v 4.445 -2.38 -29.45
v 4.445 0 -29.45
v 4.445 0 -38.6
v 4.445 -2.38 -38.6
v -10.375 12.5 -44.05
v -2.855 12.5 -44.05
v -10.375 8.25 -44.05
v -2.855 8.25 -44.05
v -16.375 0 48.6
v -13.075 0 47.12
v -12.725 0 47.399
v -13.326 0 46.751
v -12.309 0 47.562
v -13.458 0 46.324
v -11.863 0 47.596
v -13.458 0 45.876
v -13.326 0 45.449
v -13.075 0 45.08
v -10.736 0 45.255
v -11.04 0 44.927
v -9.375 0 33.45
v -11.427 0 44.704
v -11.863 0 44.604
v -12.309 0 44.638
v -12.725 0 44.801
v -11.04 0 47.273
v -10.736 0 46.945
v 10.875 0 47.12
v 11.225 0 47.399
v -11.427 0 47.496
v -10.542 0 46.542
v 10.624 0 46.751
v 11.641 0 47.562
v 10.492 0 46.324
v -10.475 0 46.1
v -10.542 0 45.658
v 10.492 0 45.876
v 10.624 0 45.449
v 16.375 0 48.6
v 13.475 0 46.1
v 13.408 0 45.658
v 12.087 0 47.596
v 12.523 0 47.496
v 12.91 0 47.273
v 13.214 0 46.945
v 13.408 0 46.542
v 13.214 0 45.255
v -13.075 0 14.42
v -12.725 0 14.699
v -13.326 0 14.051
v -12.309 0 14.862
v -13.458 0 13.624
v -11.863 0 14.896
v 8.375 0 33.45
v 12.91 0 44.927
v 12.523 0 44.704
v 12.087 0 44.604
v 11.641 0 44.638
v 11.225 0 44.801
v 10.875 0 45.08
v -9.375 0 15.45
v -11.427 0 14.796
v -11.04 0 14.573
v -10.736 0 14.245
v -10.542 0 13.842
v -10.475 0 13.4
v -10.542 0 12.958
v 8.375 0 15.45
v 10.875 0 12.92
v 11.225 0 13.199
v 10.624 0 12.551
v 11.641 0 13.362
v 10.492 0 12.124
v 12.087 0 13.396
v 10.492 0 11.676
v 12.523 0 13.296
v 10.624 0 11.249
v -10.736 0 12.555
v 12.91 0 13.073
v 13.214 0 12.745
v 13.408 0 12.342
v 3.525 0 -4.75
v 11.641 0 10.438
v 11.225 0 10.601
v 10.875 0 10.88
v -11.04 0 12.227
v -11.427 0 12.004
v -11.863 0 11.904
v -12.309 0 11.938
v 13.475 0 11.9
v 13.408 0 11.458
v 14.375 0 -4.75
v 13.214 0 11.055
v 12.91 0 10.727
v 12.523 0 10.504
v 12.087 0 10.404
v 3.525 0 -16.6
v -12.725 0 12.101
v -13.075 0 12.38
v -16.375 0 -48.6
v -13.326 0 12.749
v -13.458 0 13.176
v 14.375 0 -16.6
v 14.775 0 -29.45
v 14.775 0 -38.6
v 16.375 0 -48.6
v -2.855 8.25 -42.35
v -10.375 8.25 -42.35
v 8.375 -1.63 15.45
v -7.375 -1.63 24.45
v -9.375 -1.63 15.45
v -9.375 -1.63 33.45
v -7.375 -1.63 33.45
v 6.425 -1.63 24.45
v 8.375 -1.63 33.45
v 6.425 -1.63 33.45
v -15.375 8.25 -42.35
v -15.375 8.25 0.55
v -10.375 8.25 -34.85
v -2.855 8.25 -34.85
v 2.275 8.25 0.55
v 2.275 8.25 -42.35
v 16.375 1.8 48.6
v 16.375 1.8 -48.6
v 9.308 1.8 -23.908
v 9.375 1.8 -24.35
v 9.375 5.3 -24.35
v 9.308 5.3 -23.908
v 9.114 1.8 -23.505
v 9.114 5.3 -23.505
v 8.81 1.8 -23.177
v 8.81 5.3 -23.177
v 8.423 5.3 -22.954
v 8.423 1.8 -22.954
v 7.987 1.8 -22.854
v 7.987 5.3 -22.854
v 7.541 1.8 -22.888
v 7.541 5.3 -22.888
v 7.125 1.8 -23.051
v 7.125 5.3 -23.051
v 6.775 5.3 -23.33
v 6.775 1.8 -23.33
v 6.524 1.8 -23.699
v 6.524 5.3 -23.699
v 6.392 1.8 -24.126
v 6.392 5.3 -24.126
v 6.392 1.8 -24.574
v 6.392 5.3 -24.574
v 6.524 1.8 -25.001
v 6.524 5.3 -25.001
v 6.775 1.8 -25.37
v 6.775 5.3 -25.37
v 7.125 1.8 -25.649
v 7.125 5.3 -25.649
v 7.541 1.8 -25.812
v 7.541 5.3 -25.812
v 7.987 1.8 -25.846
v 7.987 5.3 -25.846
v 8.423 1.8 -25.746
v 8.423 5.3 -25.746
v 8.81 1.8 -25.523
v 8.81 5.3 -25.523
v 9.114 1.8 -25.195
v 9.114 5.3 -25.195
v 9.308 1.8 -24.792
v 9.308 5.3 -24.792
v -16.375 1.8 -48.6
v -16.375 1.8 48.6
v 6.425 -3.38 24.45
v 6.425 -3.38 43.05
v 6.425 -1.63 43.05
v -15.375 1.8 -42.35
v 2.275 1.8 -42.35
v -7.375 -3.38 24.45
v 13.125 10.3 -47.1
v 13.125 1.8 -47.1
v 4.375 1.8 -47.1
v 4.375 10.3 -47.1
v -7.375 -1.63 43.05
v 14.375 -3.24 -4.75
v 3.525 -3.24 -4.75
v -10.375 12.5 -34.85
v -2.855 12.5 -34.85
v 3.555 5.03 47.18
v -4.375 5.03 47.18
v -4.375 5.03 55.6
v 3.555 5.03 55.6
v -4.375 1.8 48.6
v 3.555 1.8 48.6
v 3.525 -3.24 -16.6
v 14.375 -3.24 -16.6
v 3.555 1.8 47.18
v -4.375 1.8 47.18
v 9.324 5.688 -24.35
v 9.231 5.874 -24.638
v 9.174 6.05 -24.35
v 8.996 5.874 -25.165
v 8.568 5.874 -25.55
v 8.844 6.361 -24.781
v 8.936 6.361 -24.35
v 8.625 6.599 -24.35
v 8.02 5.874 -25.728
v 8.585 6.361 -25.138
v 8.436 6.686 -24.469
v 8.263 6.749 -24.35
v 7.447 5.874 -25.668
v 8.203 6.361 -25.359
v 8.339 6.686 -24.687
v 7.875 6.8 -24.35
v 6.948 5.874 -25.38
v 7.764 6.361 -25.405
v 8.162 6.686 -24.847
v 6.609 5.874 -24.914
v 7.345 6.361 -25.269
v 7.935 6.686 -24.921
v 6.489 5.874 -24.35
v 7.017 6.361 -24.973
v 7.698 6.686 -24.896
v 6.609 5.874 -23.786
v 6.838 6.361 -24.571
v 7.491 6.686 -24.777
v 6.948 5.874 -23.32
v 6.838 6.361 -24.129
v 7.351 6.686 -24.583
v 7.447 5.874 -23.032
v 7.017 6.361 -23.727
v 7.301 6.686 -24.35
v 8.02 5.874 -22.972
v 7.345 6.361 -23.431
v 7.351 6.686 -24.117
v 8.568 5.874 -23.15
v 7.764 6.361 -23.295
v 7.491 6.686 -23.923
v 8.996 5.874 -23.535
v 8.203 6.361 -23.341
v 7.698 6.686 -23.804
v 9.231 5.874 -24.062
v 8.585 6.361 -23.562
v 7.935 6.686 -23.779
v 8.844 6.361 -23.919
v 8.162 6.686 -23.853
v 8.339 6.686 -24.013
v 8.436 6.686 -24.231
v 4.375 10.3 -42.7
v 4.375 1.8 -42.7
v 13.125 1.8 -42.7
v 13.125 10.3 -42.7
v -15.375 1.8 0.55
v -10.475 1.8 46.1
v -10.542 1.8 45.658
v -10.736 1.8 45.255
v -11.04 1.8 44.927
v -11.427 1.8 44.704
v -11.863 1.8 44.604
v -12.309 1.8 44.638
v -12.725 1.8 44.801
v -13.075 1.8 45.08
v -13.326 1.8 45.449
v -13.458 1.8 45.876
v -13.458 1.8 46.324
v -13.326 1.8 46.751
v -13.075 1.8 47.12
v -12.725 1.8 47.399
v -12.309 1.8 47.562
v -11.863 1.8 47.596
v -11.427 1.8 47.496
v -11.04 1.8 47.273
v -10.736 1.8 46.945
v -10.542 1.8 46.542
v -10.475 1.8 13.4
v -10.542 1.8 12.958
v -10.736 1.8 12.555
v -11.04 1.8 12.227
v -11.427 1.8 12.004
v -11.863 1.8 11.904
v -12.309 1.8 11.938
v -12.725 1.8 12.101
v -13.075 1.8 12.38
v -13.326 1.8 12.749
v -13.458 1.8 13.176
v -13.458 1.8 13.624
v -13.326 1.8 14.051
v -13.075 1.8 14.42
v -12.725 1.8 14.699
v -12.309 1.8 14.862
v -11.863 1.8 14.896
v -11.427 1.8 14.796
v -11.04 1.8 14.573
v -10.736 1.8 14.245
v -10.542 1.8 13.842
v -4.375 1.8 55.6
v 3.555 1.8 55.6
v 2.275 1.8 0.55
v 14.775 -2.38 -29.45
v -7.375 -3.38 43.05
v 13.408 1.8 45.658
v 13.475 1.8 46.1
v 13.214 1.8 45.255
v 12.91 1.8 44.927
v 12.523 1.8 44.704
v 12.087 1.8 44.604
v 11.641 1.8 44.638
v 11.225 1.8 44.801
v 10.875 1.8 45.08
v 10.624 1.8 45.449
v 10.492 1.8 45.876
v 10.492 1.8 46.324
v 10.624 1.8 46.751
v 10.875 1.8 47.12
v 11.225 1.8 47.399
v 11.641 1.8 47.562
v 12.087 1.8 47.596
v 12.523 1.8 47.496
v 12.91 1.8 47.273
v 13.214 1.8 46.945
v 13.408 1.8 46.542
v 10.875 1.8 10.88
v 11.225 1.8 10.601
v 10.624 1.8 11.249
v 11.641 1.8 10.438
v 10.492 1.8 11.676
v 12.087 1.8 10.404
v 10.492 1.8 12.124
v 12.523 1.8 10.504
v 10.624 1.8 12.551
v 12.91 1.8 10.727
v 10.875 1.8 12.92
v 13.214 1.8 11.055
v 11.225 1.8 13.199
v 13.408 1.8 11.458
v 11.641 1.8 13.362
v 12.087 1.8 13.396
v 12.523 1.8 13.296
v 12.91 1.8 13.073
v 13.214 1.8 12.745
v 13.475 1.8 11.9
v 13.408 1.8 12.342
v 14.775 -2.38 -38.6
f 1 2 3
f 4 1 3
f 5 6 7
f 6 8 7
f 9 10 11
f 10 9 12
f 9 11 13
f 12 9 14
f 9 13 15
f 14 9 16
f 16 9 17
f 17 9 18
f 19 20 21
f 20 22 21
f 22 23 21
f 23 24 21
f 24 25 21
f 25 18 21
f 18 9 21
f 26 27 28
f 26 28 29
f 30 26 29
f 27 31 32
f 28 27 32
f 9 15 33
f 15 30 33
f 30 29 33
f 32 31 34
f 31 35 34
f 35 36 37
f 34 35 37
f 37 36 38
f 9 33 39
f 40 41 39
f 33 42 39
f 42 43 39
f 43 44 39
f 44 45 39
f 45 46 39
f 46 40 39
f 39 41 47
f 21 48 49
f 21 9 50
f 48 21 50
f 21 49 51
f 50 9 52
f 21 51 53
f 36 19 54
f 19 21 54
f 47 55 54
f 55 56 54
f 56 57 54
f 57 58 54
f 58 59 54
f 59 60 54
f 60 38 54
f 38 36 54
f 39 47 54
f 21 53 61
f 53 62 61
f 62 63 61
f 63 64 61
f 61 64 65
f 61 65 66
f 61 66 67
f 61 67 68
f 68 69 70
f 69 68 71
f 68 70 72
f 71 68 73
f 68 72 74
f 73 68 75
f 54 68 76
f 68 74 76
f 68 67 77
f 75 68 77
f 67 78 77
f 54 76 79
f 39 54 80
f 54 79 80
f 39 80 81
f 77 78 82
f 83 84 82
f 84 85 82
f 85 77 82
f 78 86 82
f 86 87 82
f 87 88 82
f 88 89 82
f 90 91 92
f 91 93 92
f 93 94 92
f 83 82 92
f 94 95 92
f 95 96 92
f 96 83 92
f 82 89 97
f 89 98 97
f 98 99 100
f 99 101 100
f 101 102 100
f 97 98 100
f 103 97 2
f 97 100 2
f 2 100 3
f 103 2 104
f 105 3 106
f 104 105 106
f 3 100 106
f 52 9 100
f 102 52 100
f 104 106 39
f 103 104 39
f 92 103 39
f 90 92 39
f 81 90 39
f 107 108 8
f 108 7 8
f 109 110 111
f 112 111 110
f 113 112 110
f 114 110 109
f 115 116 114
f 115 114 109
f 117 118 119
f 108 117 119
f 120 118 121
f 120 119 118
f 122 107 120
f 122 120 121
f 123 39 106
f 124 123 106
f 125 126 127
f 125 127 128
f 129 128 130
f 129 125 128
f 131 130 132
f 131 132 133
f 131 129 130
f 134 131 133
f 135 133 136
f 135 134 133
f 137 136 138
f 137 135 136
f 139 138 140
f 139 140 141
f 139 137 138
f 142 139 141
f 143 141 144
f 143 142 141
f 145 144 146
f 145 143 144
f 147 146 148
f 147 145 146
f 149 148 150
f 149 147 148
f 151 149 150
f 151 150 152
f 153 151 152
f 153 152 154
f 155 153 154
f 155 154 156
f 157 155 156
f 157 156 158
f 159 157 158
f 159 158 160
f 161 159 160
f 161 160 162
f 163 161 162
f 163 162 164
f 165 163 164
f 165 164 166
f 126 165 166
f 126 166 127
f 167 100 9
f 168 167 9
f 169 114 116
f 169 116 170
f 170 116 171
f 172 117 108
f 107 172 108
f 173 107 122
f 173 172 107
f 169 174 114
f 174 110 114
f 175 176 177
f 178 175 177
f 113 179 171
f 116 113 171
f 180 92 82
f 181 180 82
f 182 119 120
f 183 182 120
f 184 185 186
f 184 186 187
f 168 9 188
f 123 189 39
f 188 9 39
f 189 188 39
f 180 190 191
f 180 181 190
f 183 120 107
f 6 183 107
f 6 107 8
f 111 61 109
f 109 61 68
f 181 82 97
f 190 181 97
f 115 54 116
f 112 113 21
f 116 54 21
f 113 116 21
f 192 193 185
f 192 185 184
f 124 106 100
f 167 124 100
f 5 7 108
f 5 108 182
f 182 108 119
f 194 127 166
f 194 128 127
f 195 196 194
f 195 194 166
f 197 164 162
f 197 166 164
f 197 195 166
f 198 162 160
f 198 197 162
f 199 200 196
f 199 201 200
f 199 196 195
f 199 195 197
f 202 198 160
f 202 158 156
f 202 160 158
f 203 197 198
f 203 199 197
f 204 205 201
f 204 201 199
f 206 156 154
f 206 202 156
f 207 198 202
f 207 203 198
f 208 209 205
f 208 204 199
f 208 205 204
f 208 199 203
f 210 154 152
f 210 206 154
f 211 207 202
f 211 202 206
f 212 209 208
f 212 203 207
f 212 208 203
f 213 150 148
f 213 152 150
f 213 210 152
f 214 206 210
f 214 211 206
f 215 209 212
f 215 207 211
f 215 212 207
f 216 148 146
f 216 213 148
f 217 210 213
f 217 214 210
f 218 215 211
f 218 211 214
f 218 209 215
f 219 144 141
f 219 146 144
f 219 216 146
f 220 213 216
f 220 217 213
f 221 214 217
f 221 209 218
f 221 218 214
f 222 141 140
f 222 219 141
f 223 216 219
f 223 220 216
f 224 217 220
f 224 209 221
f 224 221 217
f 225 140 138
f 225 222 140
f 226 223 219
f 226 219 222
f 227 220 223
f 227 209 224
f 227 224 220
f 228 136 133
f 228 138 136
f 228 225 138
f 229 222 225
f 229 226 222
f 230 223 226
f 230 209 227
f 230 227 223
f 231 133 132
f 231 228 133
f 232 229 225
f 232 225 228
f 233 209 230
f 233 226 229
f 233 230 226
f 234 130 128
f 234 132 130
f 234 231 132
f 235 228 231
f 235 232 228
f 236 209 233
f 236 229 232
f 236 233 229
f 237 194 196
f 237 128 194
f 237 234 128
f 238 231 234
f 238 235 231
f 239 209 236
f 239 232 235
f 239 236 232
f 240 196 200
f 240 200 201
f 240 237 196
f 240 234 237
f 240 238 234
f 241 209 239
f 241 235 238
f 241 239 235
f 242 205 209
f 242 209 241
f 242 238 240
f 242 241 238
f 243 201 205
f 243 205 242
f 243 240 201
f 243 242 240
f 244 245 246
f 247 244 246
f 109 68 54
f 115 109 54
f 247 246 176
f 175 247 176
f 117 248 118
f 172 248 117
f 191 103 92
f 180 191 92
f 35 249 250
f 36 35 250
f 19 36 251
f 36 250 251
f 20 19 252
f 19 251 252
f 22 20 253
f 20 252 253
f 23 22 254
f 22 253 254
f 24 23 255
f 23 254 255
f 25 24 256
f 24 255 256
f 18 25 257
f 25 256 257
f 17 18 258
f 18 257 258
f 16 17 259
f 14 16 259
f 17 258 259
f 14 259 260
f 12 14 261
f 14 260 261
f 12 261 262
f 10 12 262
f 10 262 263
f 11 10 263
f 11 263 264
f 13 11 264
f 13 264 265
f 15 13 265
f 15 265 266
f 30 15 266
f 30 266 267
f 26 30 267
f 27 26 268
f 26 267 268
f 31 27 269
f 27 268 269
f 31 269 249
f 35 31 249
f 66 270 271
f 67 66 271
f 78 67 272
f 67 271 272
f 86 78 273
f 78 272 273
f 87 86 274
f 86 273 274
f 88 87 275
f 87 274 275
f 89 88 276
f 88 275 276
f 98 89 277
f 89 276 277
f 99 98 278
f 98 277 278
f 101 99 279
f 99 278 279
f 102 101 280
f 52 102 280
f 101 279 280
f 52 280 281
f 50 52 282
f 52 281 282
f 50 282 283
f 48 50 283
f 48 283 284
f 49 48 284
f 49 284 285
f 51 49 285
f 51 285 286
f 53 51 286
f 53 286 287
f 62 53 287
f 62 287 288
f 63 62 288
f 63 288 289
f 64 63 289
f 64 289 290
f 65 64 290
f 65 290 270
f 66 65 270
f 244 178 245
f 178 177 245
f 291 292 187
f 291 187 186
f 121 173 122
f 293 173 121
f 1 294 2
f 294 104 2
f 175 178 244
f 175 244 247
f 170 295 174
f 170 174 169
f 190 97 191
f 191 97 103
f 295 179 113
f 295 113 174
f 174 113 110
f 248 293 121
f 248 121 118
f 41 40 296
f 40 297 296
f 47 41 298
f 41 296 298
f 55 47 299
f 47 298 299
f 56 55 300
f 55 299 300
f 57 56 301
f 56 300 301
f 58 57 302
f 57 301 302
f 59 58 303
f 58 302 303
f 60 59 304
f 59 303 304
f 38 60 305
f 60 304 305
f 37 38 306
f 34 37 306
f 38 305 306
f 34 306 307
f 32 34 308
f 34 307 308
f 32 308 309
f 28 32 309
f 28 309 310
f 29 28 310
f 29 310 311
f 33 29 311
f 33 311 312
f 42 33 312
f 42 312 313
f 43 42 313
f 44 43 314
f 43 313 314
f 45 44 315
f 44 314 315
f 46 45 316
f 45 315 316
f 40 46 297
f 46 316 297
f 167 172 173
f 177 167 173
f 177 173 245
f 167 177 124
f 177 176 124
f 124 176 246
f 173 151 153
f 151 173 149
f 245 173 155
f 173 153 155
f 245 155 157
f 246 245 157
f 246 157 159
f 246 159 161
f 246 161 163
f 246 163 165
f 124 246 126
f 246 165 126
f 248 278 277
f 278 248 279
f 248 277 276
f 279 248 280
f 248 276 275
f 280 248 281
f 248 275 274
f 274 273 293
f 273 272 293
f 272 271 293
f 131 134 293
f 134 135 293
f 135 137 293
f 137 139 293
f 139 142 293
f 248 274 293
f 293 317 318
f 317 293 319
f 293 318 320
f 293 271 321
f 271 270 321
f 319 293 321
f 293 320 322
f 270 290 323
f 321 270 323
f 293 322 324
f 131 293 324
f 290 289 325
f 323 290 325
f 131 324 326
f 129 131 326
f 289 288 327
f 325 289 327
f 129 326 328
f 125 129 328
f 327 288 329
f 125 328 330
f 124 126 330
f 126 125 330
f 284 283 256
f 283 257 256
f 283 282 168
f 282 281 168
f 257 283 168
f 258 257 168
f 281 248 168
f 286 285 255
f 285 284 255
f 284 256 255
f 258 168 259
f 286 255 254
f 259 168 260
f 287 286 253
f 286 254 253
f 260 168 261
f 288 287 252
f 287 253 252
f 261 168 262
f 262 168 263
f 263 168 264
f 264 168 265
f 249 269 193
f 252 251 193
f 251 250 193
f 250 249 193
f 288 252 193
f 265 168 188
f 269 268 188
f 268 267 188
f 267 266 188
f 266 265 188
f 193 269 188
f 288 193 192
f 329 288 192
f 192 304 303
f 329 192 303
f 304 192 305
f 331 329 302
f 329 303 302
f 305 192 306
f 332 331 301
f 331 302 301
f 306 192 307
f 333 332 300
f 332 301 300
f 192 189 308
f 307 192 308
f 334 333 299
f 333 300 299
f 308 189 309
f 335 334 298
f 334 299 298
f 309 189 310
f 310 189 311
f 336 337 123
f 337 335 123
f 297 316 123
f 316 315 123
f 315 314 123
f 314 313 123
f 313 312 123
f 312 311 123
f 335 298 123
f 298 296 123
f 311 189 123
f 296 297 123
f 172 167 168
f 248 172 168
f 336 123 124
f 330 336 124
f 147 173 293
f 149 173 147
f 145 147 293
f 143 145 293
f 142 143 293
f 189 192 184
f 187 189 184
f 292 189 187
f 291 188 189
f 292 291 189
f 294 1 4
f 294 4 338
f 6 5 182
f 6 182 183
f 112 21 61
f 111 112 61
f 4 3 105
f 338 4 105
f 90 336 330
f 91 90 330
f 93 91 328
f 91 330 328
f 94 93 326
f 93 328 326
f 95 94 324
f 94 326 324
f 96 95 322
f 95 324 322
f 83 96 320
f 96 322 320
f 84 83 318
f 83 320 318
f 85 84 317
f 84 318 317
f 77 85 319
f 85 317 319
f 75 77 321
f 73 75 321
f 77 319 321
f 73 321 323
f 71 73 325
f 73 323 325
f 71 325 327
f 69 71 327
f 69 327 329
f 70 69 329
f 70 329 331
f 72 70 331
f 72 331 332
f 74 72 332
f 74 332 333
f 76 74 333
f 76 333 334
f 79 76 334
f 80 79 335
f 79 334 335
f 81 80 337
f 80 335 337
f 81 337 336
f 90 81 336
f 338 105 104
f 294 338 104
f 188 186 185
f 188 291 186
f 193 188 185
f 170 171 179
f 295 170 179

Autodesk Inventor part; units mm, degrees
ref_plane "YZ Plane" through (0, 0, 0) normal (1, 0, 0) x (0, 1, 0)
ref_plane "XZ Plane" through (0, 0, 0) normal (0, 1, 0) x (-1, 0, 0)
ref_plane "XY Plane" through (0, 0, 0) normal (0, 0, 1) x (1, 0, 0)
sketch "Sketch1" plane through (0, 0, 0) normal (0, 1, 0) x (-1, 0, 0)
  line L0 (16.375, 48.6) -> (-16.375, 48.6)
  line L1 (-16.375, 48.6) -> (-16.375, -48.6)
  line L2 (-16.375, -48.6) -> (16.375, -48.6)
  line L3 (16.375, -48.6) -> (16.375, 48.6)
  line L4 (16.375, 48.6) -> (-16.375, -48.6) construction
  line L5 (-16.375, 48.6) -> (16.375, -48.6) construction
  point P0 (0, 0)
  dimension "d0" = 32.75
  dimension "d1" = 97.2
extrude "Extrusion1" add sketch "Sketch1" along normal blind 1.8
sketch "Sketch4" plane through (0, 0, 0) normal (0, -1, 0) x (1, 0, 0)
  line L0 (8.375, 33.45) -> (-9.375, 33.45)
  line L1 (-9.375, 33.45) -> (-9.375, 15.45)
  line L2 (-9.375, 15.45) -> (8.375, 15.45)
  line L3 (8.375, 15.45) -> (8.375, 33.45)
  line L4 (16.375, 48.6) -> (16.375, -48.6) projected
  line L5 (-16.375, 48.6) -> (16.375, 48.6) projected
  point P0 (0, 0)
  dimension "d12" = 18
  dimension "d13" = 17.75
  dimension "d14" = 8
  dimension "d15" = 15.15
extrude "Extrusion4" add sketch "Sketch4" along normal blind 3.43 from surface at -1.8
sketch "Sketch5" plane through (-9.375, -1.63, 33.45) normal (0, -1, 0) x (1, 0, 0)
  line L0 (2, -9) -> (15.8, -9)
  line L1 (15.8, -9) -> (15.8, 9.6)
  line L2 (15.8, 9.6) -> (2, 9.6)
  line L3 (2, 9.6) -> (2, -9)
  line L4 (0, 0) -> (0, -18) projected
  line L5 (0, -18) -> (17.75, -18) projected
  point P0 (9.375, -33.45)
  dimension "d18" = 18.6
  dimension "d19" = 13.8
  dimension "d20" = 2
  dimension "d21" = 9
extrude "Extrusion5" add sketch "Sketch5" along normal blind 1.75 from surface at 0
sketch "Sketch6" plane through (0, 0, 0) normal (0, -1, 0) x (1, 0, 0)
  line L0 (14.375, -4.75) -> (3.525, -4.75)
  line L1 (3.525, -4.75) -> (3.525, -16.6)
  line L2 (3.525, -16.6) -> (14.375, -16.6)
  line L3 (14.375, -16.6) -> (14.375, -4.75)
  line L4 (16.375, 48.6) -> (16.375, -48.6) projected
  line L5 (16.375, -48.6) -> (-16.375, -48.6) projected
  point P0 (0, 0)
  dimension "d24" = 11.85
  dimension "d25" = 10.85
  dimension "d26" = 2
  dimension "d27" = 32
extrude "Extrusion6" add sketch "Sketch6" along normal blind 5.04 from surface at -1.8
sketch "Sketch7" plane through (0, 0, 0) normal (0, -1, 0) x (1, 0, 0)
  line L0 (14.775, -29.45) -> (4.445, -29.45)
  line L1 (4.445, -29.45) -> (4.445, -38.6)
  line L2 (4.445, -38.6) -> (14.775, -38.6)
  line L3 (14.775, -38.6) -> (14.775, -29.45)
  line L4 (16.375, 48.6) -> (16.375, -48.6) projected
  line L5 (16.375, -48.6) -> (-16.375, -48.6) projected
  point P0 (0, 0)
  dimension "d30" = 9.15
  dimension "d31" = 10.33
  dimension "d32" = 1.6
  dimension "d33" = 10
extrude "Extrusion7" add sketch "Sketch7" along normal blind 4.18 from surface at -1.8
sketch "Sketch8" plane through (0, 1.8, 0) normal (0, 1, 0) x (1, 0, 0)
  line L0 (-4.375, -47.18) -> (3.555, -47.18)
  line L1 (3.555, -47.18) -> (3.555, -55.6)
  line L2 (3.555, -55.6) -> (-4.375, -55.6)
  line L3 (-4.375, -55.6) -> (-4.375, -47.18)
  line L4 (-16.375, 48.6) -> (-16.375, -48.6) projected
  line L5 (-16.375, -48.6) -> (16.375, -48.6) projected
  point P0 (0, 0)
  dimension "d36" = 8.42
  dimension "d37" = 7.93
  dimension "d38" = 12
  dimension "d39" = 7
extrude "Extrusion8" add sketch "Sketch8" along normal blind 3.23
sketch "Sketch9" plane through (0, 1.8, 0) normal (0, 1, 0) x (1, 0, 0)
  circle A0 centre (-11.975, -46.1) radius 1.5
  circle A1 centre (11.975, -46.1) radius 1.5
  circle A2 centre (11.975, -11.9) radius 1.5
  circle A3 centre (-11.975, -13.4) radius 1.5
  line L0 (-13.475, -13.4) -> (-16.375, -13.4)
  line L1 (-16.375, 48.6) -> (-16.375, -48.6) projected
  line L2 (-13.475, -13.4) -> (-11.975, -13.4) construction
  line L3 (-11.975, -46.1) -> (-13.475, -46.1) construction
  line L4 (-13.475, -46.1) -> (-16.375, -46.1)
  line L5 (-11.975, -46.1) -> (-11.975, -47.6) construction
  line L6 (-16.375, -48.6) -> (16.375, -48.6) projected
  line L7 (-11.975, -47.6) -> (-11.975, -48.6)
  line L8 (11.975, -46.1) -> (13.475, -46.1) construction
  line L9 (13.475, -46.1) -> (16.375, -46.1)
  line L10 (11.975, -46.1) -> (11.975, -47.6) construction
  line L11 (11.975, -47.6) -> (11.975, -48.6)
  line L12 (16.375, -48.6) -> (16.375, 48.6) projected
  line L13 (11.975, -46.1) -> (11.975, -44.6) construction
  line L14 (11.975, -44.6) -> (11.975, -13.4)
  line L15 (11.975, -13.4) -> (11.975, -11.9) construction
  line L16 (-11.975, -46.1) -> (-11.975, -14.9)
  line L17 (-11.975, -13.4) -> (-11.975, -14.9) construction
  point P0 (0, 0)
  dimension "d42" = 3
  dimension "d43" = 2.9
  dimension "d44" = 2.9
  dimension "d45" = 1
  dimension "d46" = 1
  dimension "d47" = 2.9
  dimension "d48" = 31.2
  dimension "d49" = 31.2
extrude "Extrusion9" cut sketch "Sketch9" against normal through all contours A0 | A2 | A3 | A1
sketch "Sketch10" plane through (0, 1.8, 0) normal (0, 1, 0) x (1, 0, 0)
  line L0 (2.275, -0.55) -> (-15.375, -0.55)
  line L1 (-15.375, -0.55) -> (-15.375, 42.35)
  line L2 (-15.375, 42.35) -> (2.275, 42.35)
  line L3 (2.275, 42.35) -> (2.275, -0.55)
  line L4 (-16.375, 48.6) -> (-16.375, -48.6) projected
  line L5 (16.375, 48.6) -> (-16.375, 48.6) projected
  point P0 (0, 0)
  dimension "d52" = 42.9
  dimension "d53" = 17.65
  dimension "d54" = 1
  dimension "d55" = 6.25
extrude "Extrusion10" add sketch "Sketch10" along normal blind 6.45
sketch "Sketch11" plane through (0, 8.25, 0) normal (0, 1, 0) x (1, 0, 0)
  line L0 (-10.375, 34.85) -> (-2.855, 34.85)
  line L1 (-2.855, 34.85) -> (-2.855, 44.05)
  line L2 (-2.855, 44.05) -> (-10.375, 44.05)
  line L3 (-10.375, 44.05) -> (-10.375, 34.85)
  line L4 (2.275, 42.35) -> (-15.375, 42.35) projected
  line L5 (-15.375, 42.35) -> (-15.375, -0.55) projected
  point P0 (0, 0)
  dimension "d58" = 9.2
  dimension "d59" = 7.52
  dimension "d60" = 7.5
  dimension "d61" = 5
extrude "Extrusion11" add sketch "Sketch11" along normal blind 4.25
sketch "Sketch12" plane through (0, 1.8, 0) normal (0, 1, 0) x (1, 0, 0)
  circle A0 centre (7.875, 24.35) radius 1.5
  line L0 (7.875, 24.35) -> (9.375, 24.35) construction
  line L1 (9.375, 24.35) -> (16.375, 24.35)
  line L2 (16.375, -48.6) -> (16.375, 48.6) projected
  line L3 (7.875, 24.35) -> (7.875, 25.85) construction
  line L4 (7.875, 25.85) -> (7.875, 48.6)
  line L5 (16.375, 48.6) -> (-16.375, 48.6) projected
  point P0 (0, 0)
  dimension "d64" = 3
  dimension "d65" = 7
  dimension "d66" = 22.75
extrude "Extrusion12" add sketch "Sketch12" along normal blind 5 contours A0
fillet "Fillet1" radius 1.5 1 edges at (6.375, 6.8, -24.35)
sketch "Sketch13" plane through (0, 1.8, 0) normal (0, 1, 0) x (1, 0, 0)
  line L0 (13.125, 47.1) -> (4.375, 47.1)
  line L1 (4.375, 47.1) -> (4.375, 42.7)
  line L2 (4.375, 42.7) -> (13.125, 42.7)
  line L3 (13.125, 42.7) -> (13.125, 47.1)
  line L4 (16.375, 48.6) -> (-16.375, 48.6) projected
  line L5 (16.375, -48.6) -> (16.375, 48.6) projected
  point P0 (0, 0)
  dimension "d70" = 8.75
  dimension "d71" = 4.4
  dimension "d72" = 1.5
  dimension "d73" = 3.25
extrude "Extrusion13" add sketch "Sketch13" along normal blind 10.3 from surface at -1.8
properties part number "PCB Board"
